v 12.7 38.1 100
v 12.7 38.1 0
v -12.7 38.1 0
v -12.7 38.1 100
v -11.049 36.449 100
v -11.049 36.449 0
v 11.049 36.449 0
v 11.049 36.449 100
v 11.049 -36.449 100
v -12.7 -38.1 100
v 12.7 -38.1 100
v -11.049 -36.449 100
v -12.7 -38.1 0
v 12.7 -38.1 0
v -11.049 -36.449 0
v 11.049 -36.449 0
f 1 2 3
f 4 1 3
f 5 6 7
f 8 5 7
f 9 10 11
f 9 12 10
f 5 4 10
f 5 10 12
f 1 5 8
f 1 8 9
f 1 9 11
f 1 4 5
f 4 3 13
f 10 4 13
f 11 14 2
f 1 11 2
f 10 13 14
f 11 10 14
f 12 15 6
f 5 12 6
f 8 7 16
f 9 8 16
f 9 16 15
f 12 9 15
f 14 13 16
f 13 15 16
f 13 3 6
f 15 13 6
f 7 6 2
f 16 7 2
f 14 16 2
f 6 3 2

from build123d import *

# Parameters (mm, degrees)
SKETCH2_W           = 11.049
SKETCH2_H           = 1.651
SKETCH2_W_2         = 1.651
SKETCH2_H_2         = 36.449
BOSS_EXTRUDE1_DEPTH = 100


with BuildPart() as part:
    # Sketch2 → Boss-Extrude1 (new body)
    with BuildSketch(Plane.XY):
        Polygon((-12.7, 0), (-11.049, 0), (-11.049, 36.449), (-11.049, 38.1), (-12.7, 38.1), align=None)
        with Locations((-5.5245, 37.2745)):
            Rectangle(SKETCH2_W, SKETCH2_H)
        Polygon((0, 38.1), (0, 36.449), (11.049, 36.449), (11.049, 0), (12.7, 0), (12.7, 38.1), align=None)
        with Locations((11.8745, -18.2245)):
            Rectangle(SKETCH2_W_2, SKETCH2_H_2)
        Polygon((-11.049, -36.449), (-11.049, 0), (-12.7, 0), (-12.7, -38.1), (0, -38.1), (0, -36.449), align=None)
        Polygon((11.049, -36.449), (0, -36.449), (0, -38.1), (12.7, -38.1), (12.7, -36.449), align=None)
    extrude(amount=BOSS_EXTRUDE1_DEPTH)


solid = part.part
